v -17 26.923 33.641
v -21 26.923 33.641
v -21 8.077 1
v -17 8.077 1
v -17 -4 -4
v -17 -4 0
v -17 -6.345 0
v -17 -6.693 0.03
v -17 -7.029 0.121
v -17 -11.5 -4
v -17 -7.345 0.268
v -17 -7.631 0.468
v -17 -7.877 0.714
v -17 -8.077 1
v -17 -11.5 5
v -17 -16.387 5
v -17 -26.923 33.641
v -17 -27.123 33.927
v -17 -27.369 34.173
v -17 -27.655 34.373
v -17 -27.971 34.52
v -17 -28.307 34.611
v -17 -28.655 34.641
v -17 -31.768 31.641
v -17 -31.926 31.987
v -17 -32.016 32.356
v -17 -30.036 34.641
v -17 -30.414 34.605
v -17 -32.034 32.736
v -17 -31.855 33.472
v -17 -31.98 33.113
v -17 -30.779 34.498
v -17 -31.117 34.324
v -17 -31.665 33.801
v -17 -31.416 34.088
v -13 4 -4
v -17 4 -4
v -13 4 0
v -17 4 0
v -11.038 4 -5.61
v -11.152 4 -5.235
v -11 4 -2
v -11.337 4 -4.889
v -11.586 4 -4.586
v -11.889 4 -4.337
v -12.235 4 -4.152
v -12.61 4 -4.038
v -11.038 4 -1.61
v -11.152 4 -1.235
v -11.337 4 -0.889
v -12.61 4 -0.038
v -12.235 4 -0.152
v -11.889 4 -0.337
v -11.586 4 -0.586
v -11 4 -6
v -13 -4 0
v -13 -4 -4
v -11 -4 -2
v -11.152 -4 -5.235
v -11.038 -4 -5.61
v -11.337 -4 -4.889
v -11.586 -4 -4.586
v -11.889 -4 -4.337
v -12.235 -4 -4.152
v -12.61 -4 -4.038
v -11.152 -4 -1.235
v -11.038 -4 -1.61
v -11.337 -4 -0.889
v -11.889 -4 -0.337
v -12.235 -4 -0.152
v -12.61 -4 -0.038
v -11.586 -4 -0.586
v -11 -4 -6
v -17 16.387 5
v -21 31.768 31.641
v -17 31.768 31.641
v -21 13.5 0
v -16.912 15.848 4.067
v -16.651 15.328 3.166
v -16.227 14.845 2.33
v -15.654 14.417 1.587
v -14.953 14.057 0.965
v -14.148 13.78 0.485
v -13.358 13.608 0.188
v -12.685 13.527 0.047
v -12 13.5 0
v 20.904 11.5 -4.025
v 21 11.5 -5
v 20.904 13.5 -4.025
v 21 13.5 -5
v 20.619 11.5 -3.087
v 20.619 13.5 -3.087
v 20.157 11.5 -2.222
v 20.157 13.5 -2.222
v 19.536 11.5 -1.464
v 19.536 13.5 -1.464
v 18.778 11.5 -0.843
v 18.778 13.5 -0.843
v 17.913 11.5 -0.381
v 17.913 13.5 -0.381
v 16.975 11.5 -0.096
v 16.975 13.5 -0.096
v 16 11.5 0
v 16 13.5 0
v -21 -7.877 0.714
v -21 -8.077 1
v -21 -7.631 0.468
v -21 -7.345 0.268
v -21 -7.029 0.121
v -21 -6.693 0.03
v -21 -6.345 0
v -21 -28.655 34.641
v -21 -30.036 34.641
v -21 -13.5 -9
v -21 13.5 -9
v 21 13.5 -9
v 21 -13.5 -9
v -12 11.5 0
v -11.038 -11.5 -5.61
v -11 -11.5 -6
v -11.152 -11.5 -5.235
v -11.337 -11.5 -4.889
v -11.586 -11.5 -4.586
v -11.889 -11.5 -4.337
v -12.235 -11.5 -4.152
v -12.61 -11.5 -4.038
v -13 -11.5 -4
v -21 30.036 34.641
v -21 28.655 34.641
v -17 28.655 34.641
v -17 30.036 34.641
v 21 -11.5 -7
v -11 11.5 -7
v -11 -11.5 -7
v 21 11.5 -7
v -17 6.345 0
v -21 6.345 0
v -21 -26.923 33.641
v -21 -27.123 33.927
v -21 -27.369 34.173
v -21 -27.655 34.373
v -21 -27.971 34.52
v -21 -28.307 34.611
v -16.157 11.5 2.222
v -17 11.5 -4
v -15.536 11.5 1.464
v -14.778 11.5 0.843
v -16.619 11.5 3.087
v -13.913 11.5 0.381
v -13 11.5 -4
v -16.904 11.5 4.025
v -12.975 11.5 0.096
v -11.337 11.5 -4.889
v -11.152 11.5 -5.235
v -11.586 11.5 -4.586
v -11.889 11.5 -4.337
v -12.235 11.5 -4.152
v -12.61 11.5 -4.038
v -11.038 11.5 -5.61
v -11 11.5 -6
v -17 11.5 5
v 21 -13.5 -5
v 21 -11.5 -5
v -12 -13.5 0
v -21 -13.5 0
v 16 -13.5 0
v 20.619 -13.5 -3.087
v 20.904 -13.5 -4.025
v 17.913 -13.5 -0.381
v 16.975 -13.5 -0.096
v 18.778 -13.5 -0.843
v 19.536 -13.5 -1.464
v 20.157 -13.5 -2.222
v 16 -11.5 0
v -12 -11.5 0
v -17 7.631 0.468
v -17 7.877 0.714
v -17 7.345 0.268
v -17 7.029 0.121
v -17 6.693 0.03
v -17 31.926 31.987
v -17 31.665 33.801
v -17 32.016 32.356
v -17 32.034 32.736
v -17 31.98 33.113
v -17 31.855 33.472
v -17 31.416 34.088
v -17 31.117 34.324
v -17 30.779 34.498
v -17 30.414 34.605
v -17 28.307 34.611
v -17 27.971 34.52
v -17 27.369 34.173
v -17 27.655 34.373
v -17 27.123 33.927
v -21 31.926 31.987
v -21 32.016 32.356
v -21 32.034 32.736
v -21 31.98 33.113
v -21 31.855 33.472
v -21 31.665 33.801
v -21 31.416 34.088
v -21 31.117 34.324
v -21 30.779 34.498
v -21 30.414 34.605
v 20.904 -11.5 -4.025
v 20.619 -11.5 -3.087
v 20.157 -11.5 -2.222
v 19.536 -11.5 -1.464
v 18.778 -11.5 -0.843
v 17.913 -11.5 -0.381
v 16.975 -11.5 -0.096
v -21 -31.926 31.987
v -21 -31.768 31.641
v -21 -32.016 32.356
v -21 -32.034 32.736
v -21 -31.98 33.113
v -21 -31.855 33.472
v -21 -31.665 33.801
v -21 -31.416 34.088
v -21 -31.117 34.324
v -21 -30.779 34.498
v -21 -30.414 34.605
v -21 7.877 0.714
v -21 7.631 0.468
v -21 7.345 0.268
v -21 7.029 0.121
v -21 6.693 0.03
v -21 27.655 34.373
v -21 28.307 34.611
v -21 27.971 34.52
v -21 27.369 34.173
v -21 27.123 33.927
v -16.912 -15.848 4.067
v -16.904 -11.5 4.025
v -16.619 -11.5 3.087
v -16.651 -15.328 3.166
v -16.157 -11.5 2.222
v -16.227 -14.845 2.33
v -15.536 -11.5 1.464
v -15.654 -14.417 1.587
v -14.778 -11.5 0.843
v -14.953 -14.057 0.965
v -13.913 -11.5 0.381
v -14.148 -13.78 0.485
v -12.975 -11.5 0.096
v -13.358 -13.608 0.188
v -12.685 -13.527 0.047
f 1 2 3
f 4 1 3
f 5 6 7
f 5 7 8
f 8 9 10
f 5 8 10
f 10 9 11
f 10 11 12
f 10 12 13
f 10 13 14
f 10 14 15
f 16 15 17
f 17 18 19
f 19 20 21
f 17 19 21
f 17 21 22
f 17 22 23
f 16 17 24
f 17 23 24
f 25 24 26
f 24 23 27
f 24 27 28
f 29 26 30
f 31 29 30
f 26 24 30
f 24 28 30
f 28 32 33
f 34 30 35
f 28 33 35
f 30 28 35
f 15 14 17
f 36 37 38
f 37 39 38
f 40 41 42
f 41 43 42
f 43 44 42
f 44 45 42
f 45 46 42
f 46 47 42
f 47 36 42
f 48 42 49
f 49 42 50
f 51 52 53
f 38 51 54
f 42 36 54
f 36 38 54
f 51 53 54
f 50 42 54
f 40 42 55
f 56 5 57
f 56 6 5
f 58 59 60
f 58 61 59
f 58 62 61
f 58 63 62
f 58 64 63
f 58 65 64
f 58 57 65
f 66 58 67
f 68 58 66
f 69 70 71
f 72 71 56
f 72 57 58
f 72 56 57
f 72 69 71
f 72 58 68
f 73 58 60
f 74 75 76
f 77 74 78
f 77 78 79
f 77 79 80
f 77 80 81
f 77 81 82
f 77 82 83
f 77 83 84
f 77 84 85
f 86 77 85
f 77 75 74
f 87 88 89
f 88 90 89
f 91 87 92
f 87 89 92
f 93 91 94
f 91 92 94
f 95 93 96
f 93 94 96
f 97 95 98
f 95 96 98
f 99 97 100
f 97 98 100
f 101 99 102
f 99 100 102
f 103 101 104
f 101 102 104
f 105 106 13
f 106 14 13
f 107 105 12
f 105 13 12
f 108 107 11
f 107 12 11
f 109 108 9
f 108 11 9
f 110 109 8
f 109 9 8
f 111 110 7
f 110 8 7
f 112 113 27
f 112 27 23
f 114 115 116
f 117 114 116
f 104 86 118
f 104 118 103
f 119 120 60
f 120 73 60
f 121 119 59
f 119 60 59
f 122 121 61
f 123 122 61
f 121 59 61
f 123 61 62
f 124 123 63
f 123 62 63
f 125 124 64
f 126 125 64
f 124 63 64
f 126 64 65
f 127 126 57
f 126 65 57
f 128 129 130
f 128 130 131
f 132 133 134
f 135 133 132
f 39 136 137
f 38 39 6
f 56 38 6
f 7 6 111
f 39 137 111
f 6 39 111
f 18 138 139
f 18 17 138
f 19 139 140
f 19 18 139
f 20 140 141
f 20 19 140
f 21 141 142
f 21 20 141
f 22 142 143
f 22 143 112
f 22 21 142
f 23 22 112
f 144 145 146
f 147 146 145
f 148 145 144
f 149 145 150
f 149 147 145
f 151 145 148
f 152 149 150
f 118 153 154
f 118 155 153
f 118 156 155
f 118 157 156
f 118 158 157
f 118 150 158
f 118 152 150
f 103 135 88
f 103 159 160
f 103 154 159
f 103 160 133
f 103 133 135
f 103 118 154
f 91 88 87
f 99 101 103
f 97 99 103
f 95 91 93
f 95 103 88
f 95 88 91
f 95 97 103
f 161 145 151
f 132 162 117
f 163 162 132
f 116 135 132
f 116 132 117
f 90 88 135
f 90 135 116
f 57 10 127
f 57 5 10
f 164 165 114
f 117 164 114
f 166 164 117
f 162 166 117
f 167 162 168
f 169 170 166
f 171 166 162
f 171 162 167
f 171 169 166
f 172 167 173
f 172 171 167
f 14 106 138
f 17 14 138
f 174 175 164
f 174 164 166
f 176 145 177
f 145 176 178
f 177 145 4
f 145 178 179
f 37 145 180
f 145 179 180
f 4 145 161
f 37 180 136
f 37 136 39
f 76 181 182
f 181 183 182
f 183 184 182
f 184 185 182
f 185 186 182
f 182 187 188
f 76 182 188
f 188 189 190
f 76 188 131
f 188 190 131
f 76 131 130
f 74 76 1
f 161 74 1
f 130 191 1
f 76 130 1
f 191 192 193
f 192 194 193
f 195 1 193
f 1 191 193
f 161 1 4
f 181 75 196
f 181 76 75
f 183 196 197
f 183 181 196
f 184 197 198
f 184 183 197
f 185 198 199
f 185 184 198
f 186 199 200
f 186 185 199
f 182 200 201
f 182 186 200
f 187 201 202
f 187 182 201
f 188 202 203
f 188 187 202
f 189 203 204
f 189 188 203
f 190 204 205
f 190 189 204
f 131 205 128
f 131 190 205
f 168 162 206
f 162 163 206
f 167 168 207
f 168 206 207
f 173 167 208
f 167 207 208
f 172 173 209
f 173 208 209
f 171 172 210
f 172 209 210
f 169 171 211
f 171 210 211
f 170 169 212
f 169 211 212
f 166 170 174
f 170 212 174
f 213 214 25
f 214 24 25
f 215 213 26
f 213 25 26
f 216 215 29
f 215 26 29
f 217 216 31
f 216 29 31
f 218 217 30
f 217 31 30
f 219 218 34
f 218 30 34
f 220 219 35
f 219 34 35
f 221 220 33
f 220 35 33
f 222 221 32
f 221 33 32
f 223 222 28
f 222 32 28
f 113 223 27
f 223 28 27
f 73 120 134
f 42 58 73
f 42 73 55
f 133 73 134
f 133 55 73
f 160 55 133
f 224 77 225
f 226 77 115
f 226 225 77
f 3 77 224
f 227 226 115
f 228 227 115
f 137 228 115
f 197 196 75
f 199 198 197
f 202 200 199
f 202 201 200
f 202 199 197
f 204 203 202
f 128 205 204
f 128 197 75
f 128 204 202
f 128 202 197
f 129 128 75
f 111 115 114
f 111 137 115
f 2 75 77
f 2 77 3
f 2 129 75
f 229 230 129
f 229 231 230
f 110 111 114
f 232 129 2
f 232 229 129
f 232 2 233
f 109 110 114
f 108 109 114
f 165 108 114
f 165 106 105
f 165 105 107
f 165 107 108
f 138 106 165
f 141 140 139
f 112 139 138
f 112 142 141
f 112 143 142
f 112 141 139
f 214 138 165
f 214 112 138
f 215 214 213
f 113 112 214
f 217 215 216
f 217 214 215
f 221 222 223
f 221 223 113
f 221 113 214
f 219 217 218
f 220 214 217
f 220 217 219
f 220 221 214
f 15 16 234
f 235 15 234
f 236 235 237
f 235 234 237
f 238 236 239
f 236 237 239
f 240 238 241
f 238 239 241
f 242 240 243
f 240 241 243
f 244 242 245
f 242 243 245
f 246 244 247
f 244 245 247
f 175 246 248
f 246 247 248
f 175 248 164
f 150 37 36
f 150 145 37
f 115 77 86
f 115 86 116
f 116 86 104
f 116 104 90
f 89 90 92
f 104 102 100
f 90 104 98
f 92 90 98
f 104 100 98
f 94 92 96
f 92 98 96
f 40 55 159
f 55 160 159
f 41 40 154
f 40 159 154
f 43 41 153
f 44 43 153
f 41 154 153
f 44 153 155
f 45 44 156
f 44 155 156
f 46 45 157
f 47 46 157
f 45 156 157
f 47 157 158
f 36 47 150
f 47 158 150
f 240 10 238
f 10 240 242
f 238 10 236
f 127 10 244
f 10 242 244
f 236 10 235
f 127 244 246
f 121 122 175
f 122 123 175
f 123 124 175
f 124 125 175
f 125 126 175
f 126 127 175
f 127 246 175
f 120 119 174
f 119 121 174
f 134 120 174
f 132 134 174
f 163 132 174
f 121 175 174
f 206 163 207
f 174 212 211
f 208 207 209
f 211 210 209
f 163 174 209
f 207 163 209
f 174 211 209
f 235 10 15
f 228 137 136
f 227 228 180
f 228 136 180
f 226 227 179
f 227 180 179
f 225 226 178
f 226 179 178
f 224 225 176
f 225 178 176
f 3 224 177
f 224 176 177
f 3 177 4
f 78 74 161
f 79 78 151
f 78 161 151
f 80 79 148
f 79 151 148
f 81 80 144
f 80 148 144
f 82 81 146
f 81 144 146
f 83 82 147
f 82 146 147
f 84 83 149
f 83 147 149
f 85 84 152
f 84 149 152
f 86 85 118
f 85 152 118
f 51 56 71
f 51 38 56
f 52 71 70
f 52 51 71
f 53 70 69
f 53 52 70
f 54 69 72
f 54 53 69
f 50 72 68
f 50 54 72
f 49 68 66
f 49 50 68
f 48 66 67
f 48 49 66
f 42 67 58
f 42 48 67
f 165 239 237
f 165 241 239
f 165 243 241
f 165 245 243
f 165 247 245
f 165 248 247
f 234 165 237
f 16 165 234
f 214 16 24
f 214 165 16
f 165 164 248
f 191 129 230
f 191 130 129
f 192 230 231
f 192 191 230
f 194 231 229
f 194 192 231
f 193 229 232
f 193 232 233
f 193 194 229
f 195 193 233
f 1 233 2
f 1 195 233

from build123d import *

# Parameters (mm, degrees)
F0_W      = 42
F0_H      = 27
F1_DEPTH  = 9
F2_W      = 32
F2_H      = 23
F3_DEPTH  = 7
F6_W      = 6
F6_H      = 7.5
F7_DEPTH  = 4
F5_W      = 6
F5_H      = 7.5
F10_DEPTH = 4
F12_DEPTH = 5
F14_R     = 2
F15_R     = 5


with BuildPart() as f1:
    # F0 (on Top) → F1 (new body)
    with BuildSketch(Plane.XY):
        Rectangle(F0_W, F0_H)
    extrude(amount=-F1_DEPTH)


with BuildPart() as f3:
    # F2 (on Top) → F3 (new body)
    with BuildSketch(Plane.XY):
        with Locations((5, 0)):
            Rectangle(F2_W, F2_H)
    extrude(amount=-F3_DEPTH)


with BuildPart() as f1_1:
    add(f1.part)

    # F4: cut F3
    add(f3.part, mode=Mode.SUBTRACT)


with BuildPart() as f7:
    # F6 (on Top) → F7 (new body)
    with BuildSketch(Plane.XY):
        with Locations((-14, -7.75)):
            Rectangle(F6_W, F6_H)
    extrude(amount=-F7_DEPTH)


with BuildPart() as f7b:
    # F5 (on Top) → F7, piece 2 (new body)
    with BuildSketch(Plane.XY):
        with Locations((-14, 7.75)):
            Rectangle(F5_W, F5_H)
    extrude(amount=-F7_DEPTH)


with BuildPart() as f1_2:
    add(f1_1.part)

    # F8: cut F7b, F7
    add(f7b.part, mode=Mode.SUBTRACT)
    add(f7.part, mode=Mode.SUBTRACT)

    # F9 (on face) → F10 (join)
    with BuildSketch(Plane(origin=(-21, 0, 0), x_dir=(0, -1, 0), z_dir=(-1, 0, 0))):
        Polygon((-13.5, 0), (13.5, 0), (33.5, 34.6410161514), (-33.5, 34.6410161514), align=None)
    extrude(amount=-F10_DEPTH)


with BuildPart() as f12:
    # F11 (on face) → F12 (new body)
    with BuildSketch(Plane(origin=(-21, 0, 0), x_dir=(0, -1, 0), z_dir=(-1, 0, 0))):
        Polygon((-7.5, 0), (7.5, 0), (27.5, 34.6410161514), (-27.5, 34.6410161514), align=None)
    extrude(amount=-F12_DEPTH)


with BuildPart() as f1_3:
    add(f1_2.part)

    # F13: cut F12
    add(f12.part, mode=Mode.SUBTRACT)

    # F14
    f14_edges = [f1_3.edges().sort_by_distance(p)[0] for p in [
        (-19, 33.5, 34.641016),
        (-19, 27.5, 34.641016),
        (-19, -27.5, 34.641016),
        (-19, -33.5, 34.641016),
        (-19, -7.5, 0),
        (-19, 7.5, 0),
        (-11, 0, 0),
        (-11, 7.75, -4),
        (-11, -7.75, -4),
    ]]
    fillet(f14_edges, radius=F14_R)

    # F15
    f15_edges = [f1_3.edges().sort_by_distance(p)[0] for p in [
        (-17, -12.5, 0),
        (-17, 12.5, 0),
        (21, 12.5, 0),
        (21, -12.5, 0),
    ]]
    fillet(f15_edges, radius=F15_R)


solid = f1_3.part
